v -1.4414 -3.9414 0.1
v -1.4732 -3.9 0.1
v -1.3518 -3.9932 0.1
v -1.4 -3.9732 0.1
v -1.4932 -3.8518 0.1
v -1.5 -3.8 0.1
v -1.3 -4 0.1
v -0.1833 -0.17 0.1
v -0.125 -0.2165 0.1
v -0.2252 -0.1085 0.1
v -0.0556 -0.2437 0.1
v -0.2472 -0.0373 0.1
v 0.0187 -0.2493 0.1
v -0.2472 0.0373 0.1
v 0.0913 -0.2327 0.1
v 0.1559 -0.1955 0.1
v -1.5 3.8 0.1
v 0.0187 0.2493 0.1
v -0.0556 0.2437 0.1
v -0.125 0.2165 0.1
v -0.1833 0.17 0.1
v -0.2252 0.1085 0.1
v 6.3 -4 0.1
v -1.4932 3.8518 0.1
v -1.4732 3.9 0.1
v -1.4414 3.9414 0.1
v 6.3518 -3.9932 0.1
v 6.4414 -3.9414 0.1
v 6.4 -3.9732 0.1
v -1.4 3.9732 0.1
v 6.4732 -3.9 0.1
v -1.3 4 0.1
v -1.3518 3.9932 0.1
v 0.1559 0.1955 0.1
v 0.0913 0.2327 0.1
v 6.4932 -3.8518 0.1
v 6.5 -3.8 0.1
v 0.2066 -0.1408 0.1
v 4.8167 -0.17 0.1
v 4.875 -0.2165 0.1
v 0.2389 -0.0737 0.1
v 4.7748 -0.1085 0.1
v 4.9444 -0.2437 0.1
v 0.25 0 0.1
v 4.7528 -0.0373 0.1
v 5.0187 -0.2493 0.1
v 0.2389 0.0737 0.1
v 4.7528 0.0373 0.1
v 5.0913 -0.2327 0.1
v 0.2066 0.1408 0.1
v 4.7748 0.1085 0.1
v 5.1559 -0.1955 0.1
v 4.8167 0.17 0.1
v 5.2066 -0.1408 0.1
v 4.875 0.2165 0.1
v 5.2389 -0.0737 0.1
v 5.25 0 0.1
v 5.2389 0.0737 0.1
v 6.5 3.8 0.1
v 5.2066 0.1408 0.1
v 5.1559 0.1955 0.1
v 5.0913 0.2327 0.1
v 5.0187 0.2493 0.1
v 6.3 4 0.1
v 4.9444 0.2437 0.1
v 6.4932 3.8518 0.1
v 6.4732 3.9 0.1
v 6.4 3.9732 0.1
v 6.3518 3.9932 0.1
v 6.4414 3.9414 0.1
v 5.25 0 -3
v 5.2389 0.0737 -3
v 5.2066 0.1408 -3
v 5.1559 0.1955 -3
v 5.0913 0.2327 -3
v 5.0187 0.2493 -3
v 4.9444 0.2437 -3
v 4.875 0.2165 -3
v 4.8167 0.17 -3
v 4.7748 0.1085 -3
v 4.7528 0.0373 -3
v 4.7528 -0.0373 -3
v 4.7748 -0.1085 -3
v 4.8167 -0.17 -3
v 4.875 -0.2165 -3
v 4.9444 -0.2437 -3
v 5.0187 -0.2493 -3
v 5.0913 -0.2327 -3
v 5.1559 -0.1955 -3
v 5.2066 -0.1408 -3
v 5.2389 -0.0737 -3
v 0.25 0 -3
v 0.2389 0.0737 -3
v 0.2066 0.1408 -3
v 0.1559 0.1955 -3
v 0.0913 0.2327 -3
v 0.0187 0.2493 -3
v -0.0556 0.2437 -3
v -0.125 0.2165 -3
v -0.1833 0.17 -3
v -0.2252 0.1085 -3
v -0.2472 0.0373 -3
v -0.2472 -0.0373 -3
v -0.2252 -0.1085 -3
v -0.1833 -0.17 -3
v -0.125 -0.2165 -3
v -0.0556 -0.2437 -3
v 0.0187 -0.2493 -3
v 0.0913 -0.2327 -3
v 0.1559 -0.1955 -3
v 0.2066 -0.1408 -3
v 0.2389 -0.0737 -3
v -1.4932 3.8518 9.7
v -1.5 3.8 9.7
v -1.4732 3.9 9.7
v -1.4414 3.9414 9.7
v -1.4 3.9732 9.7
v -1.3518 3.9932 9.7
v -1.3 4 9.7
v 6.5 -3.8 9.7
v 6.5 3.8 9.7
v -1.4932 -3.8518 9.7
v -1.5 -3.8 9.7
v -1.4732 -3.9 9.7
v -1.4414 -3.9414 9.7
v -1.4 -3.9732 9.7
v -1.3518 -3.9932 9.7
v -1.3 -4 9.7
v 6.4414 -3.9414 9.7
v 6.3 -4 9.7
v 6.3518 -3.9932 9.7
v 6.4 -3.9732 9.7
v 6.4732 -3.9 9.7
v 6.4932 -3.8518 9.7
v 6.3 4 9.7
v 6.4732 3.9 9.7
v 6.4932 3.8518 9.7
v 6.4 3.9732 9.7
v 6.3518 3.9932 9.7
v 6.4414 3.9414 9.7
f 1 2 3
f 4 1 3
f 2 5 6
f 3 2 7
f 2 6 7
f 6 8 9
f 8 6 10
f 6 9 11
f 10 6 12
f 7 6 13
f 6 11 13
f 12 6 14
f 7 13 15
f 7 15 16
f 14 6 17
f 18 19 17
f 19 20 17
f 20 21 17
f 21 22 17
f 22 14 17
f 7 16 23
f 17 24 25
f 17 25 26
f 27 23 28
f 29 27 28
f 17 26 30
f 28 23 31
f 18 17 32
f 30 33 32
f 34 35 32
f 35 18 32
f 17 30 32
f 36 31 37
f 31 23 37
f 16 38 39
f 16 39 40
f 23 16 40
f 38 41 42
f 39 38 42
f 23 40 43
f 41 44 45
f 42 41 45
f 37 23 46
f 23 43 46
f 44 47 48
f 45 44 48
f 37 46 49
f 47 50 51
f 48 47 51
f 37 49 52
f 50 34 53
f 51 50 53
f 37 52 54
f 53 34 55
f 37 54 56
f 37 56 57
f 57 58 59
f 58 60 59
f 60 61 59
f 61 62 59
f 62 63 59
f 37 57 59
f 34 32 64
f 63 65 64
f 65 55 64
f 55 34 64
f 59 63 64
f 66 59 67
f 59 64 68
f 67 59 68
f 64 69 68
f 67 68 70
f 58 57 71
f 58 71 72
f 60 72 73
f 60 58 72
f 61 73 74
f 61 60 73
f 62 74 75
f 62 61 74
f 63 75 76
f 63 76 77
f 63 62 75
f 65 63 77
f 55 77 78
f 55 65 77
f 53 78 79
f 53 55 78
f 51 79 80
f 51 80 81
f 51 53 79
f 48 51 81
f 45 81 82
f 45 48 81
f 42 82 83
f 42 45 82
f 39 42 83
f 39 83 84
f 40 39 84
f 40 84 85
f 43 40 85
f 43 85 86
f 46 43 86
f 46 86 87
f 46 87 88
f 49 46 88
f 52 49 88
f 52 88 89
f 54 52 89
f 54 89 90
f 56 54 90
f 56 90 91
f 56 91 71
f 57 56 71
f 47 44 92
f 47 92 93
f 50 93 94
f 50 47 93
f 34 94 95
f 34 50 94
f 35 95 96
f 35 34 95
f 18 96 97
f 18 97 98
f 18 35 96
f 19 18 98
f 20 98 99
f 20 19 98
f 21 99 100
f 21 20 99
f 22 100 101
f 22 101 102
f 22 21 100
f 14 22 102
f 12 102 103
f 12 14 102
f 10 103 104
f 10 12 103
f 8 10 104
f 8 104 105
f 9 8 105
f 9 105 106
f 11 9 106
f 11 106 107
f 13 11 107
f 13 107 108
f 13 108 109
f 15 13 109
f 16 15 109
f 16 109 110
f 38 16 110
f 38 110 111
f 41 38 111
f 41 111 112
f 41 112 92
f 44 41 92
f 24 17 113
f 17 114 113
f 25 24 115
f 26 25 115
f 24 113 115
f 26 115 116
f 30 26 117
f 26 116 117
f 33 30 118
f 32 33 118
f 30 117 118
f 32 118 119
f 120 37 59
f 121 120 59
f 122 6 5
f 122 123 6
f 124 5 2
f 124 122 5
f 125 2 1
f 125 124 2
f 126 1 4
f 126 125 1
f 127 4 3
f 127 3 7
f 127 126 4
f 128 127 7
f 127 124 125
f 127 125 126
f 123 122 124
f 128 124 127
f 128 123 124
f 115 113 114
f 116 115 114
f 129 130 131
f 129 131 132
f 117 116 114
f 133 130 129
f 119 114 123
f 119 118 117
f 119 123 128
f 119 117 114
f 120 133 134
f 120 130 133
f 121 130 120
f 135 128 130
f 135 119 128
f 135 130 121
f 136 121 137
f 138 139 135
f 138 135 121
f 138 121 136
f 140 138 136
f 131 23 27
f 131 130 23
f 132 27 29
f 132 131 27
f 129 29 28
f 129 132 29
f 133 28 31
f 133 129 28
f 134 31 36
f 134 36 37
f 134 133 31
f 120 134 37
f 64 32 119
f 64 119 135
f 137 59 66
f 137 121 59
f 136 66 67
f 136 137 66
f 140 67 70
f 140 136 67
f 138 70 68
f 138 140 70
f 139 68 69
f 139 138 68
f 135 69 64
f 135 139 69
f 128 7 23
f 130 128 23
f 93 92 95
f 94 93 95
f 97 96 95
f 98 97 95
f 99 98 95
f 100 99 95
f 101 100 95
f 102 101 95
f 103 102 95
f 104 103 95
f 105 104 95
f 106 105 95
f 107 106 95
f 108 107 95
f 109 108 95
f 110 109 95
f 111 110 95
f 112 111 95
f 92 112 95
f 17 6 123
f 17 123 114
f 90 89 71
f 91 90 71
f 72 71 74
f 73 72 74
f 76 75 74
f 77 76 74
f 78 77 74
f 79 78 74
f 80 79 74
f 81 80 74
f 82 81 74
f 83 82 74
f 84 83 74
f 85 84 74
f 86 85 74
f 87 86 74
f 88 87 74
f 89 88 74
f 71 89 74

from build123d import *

# Parameters (mm, degrees)
SKETCH_W     = 8
SKETCH_H     = 8
PAD_DEPTH    = 9.6
FILLET_R     = 0.2
SKETCH001_R  = 0.25
PAD001_DEPTH = 3.5


with BuildPart() as fillet_body:
    # Sketch → Pad (new body)
    with BuildSketch(Plane.XY.offset(0.1)):
        with Locations((2.5, 0)):
            Rectangle(SKETCH_W, SKETCH_H)
    extrude(amount=PAD_DEPTH)

    # Fillet
    fillet_edges = [fillet_body.edges().sort_by_distance(p)[0] for p in [
        (6.5, -4, 4.9),
        (6.5, 4, 4.9),
        (-1.5, -4, 4.9),
        (-1.5, 4, 4.9),
    ]]
    fillet(fillet_edges, radius=FILLET_R)


with BuildPart() as pad001_mp_cp:
    # Sketch001 → Pad001 (new body)
    with BuildSketch(Plane.XY.offset(0.5)):
        Circle(SKETCH001_R)
        with Locations((5, 0)):
            Circle(SKETCH001_R)
    extrude(amount=-PAD001_DEPTH)

    # Pad001_mp_cp: union Fillet body
    add(fillet_body.part)


solid = pad001_mp_cp.part
